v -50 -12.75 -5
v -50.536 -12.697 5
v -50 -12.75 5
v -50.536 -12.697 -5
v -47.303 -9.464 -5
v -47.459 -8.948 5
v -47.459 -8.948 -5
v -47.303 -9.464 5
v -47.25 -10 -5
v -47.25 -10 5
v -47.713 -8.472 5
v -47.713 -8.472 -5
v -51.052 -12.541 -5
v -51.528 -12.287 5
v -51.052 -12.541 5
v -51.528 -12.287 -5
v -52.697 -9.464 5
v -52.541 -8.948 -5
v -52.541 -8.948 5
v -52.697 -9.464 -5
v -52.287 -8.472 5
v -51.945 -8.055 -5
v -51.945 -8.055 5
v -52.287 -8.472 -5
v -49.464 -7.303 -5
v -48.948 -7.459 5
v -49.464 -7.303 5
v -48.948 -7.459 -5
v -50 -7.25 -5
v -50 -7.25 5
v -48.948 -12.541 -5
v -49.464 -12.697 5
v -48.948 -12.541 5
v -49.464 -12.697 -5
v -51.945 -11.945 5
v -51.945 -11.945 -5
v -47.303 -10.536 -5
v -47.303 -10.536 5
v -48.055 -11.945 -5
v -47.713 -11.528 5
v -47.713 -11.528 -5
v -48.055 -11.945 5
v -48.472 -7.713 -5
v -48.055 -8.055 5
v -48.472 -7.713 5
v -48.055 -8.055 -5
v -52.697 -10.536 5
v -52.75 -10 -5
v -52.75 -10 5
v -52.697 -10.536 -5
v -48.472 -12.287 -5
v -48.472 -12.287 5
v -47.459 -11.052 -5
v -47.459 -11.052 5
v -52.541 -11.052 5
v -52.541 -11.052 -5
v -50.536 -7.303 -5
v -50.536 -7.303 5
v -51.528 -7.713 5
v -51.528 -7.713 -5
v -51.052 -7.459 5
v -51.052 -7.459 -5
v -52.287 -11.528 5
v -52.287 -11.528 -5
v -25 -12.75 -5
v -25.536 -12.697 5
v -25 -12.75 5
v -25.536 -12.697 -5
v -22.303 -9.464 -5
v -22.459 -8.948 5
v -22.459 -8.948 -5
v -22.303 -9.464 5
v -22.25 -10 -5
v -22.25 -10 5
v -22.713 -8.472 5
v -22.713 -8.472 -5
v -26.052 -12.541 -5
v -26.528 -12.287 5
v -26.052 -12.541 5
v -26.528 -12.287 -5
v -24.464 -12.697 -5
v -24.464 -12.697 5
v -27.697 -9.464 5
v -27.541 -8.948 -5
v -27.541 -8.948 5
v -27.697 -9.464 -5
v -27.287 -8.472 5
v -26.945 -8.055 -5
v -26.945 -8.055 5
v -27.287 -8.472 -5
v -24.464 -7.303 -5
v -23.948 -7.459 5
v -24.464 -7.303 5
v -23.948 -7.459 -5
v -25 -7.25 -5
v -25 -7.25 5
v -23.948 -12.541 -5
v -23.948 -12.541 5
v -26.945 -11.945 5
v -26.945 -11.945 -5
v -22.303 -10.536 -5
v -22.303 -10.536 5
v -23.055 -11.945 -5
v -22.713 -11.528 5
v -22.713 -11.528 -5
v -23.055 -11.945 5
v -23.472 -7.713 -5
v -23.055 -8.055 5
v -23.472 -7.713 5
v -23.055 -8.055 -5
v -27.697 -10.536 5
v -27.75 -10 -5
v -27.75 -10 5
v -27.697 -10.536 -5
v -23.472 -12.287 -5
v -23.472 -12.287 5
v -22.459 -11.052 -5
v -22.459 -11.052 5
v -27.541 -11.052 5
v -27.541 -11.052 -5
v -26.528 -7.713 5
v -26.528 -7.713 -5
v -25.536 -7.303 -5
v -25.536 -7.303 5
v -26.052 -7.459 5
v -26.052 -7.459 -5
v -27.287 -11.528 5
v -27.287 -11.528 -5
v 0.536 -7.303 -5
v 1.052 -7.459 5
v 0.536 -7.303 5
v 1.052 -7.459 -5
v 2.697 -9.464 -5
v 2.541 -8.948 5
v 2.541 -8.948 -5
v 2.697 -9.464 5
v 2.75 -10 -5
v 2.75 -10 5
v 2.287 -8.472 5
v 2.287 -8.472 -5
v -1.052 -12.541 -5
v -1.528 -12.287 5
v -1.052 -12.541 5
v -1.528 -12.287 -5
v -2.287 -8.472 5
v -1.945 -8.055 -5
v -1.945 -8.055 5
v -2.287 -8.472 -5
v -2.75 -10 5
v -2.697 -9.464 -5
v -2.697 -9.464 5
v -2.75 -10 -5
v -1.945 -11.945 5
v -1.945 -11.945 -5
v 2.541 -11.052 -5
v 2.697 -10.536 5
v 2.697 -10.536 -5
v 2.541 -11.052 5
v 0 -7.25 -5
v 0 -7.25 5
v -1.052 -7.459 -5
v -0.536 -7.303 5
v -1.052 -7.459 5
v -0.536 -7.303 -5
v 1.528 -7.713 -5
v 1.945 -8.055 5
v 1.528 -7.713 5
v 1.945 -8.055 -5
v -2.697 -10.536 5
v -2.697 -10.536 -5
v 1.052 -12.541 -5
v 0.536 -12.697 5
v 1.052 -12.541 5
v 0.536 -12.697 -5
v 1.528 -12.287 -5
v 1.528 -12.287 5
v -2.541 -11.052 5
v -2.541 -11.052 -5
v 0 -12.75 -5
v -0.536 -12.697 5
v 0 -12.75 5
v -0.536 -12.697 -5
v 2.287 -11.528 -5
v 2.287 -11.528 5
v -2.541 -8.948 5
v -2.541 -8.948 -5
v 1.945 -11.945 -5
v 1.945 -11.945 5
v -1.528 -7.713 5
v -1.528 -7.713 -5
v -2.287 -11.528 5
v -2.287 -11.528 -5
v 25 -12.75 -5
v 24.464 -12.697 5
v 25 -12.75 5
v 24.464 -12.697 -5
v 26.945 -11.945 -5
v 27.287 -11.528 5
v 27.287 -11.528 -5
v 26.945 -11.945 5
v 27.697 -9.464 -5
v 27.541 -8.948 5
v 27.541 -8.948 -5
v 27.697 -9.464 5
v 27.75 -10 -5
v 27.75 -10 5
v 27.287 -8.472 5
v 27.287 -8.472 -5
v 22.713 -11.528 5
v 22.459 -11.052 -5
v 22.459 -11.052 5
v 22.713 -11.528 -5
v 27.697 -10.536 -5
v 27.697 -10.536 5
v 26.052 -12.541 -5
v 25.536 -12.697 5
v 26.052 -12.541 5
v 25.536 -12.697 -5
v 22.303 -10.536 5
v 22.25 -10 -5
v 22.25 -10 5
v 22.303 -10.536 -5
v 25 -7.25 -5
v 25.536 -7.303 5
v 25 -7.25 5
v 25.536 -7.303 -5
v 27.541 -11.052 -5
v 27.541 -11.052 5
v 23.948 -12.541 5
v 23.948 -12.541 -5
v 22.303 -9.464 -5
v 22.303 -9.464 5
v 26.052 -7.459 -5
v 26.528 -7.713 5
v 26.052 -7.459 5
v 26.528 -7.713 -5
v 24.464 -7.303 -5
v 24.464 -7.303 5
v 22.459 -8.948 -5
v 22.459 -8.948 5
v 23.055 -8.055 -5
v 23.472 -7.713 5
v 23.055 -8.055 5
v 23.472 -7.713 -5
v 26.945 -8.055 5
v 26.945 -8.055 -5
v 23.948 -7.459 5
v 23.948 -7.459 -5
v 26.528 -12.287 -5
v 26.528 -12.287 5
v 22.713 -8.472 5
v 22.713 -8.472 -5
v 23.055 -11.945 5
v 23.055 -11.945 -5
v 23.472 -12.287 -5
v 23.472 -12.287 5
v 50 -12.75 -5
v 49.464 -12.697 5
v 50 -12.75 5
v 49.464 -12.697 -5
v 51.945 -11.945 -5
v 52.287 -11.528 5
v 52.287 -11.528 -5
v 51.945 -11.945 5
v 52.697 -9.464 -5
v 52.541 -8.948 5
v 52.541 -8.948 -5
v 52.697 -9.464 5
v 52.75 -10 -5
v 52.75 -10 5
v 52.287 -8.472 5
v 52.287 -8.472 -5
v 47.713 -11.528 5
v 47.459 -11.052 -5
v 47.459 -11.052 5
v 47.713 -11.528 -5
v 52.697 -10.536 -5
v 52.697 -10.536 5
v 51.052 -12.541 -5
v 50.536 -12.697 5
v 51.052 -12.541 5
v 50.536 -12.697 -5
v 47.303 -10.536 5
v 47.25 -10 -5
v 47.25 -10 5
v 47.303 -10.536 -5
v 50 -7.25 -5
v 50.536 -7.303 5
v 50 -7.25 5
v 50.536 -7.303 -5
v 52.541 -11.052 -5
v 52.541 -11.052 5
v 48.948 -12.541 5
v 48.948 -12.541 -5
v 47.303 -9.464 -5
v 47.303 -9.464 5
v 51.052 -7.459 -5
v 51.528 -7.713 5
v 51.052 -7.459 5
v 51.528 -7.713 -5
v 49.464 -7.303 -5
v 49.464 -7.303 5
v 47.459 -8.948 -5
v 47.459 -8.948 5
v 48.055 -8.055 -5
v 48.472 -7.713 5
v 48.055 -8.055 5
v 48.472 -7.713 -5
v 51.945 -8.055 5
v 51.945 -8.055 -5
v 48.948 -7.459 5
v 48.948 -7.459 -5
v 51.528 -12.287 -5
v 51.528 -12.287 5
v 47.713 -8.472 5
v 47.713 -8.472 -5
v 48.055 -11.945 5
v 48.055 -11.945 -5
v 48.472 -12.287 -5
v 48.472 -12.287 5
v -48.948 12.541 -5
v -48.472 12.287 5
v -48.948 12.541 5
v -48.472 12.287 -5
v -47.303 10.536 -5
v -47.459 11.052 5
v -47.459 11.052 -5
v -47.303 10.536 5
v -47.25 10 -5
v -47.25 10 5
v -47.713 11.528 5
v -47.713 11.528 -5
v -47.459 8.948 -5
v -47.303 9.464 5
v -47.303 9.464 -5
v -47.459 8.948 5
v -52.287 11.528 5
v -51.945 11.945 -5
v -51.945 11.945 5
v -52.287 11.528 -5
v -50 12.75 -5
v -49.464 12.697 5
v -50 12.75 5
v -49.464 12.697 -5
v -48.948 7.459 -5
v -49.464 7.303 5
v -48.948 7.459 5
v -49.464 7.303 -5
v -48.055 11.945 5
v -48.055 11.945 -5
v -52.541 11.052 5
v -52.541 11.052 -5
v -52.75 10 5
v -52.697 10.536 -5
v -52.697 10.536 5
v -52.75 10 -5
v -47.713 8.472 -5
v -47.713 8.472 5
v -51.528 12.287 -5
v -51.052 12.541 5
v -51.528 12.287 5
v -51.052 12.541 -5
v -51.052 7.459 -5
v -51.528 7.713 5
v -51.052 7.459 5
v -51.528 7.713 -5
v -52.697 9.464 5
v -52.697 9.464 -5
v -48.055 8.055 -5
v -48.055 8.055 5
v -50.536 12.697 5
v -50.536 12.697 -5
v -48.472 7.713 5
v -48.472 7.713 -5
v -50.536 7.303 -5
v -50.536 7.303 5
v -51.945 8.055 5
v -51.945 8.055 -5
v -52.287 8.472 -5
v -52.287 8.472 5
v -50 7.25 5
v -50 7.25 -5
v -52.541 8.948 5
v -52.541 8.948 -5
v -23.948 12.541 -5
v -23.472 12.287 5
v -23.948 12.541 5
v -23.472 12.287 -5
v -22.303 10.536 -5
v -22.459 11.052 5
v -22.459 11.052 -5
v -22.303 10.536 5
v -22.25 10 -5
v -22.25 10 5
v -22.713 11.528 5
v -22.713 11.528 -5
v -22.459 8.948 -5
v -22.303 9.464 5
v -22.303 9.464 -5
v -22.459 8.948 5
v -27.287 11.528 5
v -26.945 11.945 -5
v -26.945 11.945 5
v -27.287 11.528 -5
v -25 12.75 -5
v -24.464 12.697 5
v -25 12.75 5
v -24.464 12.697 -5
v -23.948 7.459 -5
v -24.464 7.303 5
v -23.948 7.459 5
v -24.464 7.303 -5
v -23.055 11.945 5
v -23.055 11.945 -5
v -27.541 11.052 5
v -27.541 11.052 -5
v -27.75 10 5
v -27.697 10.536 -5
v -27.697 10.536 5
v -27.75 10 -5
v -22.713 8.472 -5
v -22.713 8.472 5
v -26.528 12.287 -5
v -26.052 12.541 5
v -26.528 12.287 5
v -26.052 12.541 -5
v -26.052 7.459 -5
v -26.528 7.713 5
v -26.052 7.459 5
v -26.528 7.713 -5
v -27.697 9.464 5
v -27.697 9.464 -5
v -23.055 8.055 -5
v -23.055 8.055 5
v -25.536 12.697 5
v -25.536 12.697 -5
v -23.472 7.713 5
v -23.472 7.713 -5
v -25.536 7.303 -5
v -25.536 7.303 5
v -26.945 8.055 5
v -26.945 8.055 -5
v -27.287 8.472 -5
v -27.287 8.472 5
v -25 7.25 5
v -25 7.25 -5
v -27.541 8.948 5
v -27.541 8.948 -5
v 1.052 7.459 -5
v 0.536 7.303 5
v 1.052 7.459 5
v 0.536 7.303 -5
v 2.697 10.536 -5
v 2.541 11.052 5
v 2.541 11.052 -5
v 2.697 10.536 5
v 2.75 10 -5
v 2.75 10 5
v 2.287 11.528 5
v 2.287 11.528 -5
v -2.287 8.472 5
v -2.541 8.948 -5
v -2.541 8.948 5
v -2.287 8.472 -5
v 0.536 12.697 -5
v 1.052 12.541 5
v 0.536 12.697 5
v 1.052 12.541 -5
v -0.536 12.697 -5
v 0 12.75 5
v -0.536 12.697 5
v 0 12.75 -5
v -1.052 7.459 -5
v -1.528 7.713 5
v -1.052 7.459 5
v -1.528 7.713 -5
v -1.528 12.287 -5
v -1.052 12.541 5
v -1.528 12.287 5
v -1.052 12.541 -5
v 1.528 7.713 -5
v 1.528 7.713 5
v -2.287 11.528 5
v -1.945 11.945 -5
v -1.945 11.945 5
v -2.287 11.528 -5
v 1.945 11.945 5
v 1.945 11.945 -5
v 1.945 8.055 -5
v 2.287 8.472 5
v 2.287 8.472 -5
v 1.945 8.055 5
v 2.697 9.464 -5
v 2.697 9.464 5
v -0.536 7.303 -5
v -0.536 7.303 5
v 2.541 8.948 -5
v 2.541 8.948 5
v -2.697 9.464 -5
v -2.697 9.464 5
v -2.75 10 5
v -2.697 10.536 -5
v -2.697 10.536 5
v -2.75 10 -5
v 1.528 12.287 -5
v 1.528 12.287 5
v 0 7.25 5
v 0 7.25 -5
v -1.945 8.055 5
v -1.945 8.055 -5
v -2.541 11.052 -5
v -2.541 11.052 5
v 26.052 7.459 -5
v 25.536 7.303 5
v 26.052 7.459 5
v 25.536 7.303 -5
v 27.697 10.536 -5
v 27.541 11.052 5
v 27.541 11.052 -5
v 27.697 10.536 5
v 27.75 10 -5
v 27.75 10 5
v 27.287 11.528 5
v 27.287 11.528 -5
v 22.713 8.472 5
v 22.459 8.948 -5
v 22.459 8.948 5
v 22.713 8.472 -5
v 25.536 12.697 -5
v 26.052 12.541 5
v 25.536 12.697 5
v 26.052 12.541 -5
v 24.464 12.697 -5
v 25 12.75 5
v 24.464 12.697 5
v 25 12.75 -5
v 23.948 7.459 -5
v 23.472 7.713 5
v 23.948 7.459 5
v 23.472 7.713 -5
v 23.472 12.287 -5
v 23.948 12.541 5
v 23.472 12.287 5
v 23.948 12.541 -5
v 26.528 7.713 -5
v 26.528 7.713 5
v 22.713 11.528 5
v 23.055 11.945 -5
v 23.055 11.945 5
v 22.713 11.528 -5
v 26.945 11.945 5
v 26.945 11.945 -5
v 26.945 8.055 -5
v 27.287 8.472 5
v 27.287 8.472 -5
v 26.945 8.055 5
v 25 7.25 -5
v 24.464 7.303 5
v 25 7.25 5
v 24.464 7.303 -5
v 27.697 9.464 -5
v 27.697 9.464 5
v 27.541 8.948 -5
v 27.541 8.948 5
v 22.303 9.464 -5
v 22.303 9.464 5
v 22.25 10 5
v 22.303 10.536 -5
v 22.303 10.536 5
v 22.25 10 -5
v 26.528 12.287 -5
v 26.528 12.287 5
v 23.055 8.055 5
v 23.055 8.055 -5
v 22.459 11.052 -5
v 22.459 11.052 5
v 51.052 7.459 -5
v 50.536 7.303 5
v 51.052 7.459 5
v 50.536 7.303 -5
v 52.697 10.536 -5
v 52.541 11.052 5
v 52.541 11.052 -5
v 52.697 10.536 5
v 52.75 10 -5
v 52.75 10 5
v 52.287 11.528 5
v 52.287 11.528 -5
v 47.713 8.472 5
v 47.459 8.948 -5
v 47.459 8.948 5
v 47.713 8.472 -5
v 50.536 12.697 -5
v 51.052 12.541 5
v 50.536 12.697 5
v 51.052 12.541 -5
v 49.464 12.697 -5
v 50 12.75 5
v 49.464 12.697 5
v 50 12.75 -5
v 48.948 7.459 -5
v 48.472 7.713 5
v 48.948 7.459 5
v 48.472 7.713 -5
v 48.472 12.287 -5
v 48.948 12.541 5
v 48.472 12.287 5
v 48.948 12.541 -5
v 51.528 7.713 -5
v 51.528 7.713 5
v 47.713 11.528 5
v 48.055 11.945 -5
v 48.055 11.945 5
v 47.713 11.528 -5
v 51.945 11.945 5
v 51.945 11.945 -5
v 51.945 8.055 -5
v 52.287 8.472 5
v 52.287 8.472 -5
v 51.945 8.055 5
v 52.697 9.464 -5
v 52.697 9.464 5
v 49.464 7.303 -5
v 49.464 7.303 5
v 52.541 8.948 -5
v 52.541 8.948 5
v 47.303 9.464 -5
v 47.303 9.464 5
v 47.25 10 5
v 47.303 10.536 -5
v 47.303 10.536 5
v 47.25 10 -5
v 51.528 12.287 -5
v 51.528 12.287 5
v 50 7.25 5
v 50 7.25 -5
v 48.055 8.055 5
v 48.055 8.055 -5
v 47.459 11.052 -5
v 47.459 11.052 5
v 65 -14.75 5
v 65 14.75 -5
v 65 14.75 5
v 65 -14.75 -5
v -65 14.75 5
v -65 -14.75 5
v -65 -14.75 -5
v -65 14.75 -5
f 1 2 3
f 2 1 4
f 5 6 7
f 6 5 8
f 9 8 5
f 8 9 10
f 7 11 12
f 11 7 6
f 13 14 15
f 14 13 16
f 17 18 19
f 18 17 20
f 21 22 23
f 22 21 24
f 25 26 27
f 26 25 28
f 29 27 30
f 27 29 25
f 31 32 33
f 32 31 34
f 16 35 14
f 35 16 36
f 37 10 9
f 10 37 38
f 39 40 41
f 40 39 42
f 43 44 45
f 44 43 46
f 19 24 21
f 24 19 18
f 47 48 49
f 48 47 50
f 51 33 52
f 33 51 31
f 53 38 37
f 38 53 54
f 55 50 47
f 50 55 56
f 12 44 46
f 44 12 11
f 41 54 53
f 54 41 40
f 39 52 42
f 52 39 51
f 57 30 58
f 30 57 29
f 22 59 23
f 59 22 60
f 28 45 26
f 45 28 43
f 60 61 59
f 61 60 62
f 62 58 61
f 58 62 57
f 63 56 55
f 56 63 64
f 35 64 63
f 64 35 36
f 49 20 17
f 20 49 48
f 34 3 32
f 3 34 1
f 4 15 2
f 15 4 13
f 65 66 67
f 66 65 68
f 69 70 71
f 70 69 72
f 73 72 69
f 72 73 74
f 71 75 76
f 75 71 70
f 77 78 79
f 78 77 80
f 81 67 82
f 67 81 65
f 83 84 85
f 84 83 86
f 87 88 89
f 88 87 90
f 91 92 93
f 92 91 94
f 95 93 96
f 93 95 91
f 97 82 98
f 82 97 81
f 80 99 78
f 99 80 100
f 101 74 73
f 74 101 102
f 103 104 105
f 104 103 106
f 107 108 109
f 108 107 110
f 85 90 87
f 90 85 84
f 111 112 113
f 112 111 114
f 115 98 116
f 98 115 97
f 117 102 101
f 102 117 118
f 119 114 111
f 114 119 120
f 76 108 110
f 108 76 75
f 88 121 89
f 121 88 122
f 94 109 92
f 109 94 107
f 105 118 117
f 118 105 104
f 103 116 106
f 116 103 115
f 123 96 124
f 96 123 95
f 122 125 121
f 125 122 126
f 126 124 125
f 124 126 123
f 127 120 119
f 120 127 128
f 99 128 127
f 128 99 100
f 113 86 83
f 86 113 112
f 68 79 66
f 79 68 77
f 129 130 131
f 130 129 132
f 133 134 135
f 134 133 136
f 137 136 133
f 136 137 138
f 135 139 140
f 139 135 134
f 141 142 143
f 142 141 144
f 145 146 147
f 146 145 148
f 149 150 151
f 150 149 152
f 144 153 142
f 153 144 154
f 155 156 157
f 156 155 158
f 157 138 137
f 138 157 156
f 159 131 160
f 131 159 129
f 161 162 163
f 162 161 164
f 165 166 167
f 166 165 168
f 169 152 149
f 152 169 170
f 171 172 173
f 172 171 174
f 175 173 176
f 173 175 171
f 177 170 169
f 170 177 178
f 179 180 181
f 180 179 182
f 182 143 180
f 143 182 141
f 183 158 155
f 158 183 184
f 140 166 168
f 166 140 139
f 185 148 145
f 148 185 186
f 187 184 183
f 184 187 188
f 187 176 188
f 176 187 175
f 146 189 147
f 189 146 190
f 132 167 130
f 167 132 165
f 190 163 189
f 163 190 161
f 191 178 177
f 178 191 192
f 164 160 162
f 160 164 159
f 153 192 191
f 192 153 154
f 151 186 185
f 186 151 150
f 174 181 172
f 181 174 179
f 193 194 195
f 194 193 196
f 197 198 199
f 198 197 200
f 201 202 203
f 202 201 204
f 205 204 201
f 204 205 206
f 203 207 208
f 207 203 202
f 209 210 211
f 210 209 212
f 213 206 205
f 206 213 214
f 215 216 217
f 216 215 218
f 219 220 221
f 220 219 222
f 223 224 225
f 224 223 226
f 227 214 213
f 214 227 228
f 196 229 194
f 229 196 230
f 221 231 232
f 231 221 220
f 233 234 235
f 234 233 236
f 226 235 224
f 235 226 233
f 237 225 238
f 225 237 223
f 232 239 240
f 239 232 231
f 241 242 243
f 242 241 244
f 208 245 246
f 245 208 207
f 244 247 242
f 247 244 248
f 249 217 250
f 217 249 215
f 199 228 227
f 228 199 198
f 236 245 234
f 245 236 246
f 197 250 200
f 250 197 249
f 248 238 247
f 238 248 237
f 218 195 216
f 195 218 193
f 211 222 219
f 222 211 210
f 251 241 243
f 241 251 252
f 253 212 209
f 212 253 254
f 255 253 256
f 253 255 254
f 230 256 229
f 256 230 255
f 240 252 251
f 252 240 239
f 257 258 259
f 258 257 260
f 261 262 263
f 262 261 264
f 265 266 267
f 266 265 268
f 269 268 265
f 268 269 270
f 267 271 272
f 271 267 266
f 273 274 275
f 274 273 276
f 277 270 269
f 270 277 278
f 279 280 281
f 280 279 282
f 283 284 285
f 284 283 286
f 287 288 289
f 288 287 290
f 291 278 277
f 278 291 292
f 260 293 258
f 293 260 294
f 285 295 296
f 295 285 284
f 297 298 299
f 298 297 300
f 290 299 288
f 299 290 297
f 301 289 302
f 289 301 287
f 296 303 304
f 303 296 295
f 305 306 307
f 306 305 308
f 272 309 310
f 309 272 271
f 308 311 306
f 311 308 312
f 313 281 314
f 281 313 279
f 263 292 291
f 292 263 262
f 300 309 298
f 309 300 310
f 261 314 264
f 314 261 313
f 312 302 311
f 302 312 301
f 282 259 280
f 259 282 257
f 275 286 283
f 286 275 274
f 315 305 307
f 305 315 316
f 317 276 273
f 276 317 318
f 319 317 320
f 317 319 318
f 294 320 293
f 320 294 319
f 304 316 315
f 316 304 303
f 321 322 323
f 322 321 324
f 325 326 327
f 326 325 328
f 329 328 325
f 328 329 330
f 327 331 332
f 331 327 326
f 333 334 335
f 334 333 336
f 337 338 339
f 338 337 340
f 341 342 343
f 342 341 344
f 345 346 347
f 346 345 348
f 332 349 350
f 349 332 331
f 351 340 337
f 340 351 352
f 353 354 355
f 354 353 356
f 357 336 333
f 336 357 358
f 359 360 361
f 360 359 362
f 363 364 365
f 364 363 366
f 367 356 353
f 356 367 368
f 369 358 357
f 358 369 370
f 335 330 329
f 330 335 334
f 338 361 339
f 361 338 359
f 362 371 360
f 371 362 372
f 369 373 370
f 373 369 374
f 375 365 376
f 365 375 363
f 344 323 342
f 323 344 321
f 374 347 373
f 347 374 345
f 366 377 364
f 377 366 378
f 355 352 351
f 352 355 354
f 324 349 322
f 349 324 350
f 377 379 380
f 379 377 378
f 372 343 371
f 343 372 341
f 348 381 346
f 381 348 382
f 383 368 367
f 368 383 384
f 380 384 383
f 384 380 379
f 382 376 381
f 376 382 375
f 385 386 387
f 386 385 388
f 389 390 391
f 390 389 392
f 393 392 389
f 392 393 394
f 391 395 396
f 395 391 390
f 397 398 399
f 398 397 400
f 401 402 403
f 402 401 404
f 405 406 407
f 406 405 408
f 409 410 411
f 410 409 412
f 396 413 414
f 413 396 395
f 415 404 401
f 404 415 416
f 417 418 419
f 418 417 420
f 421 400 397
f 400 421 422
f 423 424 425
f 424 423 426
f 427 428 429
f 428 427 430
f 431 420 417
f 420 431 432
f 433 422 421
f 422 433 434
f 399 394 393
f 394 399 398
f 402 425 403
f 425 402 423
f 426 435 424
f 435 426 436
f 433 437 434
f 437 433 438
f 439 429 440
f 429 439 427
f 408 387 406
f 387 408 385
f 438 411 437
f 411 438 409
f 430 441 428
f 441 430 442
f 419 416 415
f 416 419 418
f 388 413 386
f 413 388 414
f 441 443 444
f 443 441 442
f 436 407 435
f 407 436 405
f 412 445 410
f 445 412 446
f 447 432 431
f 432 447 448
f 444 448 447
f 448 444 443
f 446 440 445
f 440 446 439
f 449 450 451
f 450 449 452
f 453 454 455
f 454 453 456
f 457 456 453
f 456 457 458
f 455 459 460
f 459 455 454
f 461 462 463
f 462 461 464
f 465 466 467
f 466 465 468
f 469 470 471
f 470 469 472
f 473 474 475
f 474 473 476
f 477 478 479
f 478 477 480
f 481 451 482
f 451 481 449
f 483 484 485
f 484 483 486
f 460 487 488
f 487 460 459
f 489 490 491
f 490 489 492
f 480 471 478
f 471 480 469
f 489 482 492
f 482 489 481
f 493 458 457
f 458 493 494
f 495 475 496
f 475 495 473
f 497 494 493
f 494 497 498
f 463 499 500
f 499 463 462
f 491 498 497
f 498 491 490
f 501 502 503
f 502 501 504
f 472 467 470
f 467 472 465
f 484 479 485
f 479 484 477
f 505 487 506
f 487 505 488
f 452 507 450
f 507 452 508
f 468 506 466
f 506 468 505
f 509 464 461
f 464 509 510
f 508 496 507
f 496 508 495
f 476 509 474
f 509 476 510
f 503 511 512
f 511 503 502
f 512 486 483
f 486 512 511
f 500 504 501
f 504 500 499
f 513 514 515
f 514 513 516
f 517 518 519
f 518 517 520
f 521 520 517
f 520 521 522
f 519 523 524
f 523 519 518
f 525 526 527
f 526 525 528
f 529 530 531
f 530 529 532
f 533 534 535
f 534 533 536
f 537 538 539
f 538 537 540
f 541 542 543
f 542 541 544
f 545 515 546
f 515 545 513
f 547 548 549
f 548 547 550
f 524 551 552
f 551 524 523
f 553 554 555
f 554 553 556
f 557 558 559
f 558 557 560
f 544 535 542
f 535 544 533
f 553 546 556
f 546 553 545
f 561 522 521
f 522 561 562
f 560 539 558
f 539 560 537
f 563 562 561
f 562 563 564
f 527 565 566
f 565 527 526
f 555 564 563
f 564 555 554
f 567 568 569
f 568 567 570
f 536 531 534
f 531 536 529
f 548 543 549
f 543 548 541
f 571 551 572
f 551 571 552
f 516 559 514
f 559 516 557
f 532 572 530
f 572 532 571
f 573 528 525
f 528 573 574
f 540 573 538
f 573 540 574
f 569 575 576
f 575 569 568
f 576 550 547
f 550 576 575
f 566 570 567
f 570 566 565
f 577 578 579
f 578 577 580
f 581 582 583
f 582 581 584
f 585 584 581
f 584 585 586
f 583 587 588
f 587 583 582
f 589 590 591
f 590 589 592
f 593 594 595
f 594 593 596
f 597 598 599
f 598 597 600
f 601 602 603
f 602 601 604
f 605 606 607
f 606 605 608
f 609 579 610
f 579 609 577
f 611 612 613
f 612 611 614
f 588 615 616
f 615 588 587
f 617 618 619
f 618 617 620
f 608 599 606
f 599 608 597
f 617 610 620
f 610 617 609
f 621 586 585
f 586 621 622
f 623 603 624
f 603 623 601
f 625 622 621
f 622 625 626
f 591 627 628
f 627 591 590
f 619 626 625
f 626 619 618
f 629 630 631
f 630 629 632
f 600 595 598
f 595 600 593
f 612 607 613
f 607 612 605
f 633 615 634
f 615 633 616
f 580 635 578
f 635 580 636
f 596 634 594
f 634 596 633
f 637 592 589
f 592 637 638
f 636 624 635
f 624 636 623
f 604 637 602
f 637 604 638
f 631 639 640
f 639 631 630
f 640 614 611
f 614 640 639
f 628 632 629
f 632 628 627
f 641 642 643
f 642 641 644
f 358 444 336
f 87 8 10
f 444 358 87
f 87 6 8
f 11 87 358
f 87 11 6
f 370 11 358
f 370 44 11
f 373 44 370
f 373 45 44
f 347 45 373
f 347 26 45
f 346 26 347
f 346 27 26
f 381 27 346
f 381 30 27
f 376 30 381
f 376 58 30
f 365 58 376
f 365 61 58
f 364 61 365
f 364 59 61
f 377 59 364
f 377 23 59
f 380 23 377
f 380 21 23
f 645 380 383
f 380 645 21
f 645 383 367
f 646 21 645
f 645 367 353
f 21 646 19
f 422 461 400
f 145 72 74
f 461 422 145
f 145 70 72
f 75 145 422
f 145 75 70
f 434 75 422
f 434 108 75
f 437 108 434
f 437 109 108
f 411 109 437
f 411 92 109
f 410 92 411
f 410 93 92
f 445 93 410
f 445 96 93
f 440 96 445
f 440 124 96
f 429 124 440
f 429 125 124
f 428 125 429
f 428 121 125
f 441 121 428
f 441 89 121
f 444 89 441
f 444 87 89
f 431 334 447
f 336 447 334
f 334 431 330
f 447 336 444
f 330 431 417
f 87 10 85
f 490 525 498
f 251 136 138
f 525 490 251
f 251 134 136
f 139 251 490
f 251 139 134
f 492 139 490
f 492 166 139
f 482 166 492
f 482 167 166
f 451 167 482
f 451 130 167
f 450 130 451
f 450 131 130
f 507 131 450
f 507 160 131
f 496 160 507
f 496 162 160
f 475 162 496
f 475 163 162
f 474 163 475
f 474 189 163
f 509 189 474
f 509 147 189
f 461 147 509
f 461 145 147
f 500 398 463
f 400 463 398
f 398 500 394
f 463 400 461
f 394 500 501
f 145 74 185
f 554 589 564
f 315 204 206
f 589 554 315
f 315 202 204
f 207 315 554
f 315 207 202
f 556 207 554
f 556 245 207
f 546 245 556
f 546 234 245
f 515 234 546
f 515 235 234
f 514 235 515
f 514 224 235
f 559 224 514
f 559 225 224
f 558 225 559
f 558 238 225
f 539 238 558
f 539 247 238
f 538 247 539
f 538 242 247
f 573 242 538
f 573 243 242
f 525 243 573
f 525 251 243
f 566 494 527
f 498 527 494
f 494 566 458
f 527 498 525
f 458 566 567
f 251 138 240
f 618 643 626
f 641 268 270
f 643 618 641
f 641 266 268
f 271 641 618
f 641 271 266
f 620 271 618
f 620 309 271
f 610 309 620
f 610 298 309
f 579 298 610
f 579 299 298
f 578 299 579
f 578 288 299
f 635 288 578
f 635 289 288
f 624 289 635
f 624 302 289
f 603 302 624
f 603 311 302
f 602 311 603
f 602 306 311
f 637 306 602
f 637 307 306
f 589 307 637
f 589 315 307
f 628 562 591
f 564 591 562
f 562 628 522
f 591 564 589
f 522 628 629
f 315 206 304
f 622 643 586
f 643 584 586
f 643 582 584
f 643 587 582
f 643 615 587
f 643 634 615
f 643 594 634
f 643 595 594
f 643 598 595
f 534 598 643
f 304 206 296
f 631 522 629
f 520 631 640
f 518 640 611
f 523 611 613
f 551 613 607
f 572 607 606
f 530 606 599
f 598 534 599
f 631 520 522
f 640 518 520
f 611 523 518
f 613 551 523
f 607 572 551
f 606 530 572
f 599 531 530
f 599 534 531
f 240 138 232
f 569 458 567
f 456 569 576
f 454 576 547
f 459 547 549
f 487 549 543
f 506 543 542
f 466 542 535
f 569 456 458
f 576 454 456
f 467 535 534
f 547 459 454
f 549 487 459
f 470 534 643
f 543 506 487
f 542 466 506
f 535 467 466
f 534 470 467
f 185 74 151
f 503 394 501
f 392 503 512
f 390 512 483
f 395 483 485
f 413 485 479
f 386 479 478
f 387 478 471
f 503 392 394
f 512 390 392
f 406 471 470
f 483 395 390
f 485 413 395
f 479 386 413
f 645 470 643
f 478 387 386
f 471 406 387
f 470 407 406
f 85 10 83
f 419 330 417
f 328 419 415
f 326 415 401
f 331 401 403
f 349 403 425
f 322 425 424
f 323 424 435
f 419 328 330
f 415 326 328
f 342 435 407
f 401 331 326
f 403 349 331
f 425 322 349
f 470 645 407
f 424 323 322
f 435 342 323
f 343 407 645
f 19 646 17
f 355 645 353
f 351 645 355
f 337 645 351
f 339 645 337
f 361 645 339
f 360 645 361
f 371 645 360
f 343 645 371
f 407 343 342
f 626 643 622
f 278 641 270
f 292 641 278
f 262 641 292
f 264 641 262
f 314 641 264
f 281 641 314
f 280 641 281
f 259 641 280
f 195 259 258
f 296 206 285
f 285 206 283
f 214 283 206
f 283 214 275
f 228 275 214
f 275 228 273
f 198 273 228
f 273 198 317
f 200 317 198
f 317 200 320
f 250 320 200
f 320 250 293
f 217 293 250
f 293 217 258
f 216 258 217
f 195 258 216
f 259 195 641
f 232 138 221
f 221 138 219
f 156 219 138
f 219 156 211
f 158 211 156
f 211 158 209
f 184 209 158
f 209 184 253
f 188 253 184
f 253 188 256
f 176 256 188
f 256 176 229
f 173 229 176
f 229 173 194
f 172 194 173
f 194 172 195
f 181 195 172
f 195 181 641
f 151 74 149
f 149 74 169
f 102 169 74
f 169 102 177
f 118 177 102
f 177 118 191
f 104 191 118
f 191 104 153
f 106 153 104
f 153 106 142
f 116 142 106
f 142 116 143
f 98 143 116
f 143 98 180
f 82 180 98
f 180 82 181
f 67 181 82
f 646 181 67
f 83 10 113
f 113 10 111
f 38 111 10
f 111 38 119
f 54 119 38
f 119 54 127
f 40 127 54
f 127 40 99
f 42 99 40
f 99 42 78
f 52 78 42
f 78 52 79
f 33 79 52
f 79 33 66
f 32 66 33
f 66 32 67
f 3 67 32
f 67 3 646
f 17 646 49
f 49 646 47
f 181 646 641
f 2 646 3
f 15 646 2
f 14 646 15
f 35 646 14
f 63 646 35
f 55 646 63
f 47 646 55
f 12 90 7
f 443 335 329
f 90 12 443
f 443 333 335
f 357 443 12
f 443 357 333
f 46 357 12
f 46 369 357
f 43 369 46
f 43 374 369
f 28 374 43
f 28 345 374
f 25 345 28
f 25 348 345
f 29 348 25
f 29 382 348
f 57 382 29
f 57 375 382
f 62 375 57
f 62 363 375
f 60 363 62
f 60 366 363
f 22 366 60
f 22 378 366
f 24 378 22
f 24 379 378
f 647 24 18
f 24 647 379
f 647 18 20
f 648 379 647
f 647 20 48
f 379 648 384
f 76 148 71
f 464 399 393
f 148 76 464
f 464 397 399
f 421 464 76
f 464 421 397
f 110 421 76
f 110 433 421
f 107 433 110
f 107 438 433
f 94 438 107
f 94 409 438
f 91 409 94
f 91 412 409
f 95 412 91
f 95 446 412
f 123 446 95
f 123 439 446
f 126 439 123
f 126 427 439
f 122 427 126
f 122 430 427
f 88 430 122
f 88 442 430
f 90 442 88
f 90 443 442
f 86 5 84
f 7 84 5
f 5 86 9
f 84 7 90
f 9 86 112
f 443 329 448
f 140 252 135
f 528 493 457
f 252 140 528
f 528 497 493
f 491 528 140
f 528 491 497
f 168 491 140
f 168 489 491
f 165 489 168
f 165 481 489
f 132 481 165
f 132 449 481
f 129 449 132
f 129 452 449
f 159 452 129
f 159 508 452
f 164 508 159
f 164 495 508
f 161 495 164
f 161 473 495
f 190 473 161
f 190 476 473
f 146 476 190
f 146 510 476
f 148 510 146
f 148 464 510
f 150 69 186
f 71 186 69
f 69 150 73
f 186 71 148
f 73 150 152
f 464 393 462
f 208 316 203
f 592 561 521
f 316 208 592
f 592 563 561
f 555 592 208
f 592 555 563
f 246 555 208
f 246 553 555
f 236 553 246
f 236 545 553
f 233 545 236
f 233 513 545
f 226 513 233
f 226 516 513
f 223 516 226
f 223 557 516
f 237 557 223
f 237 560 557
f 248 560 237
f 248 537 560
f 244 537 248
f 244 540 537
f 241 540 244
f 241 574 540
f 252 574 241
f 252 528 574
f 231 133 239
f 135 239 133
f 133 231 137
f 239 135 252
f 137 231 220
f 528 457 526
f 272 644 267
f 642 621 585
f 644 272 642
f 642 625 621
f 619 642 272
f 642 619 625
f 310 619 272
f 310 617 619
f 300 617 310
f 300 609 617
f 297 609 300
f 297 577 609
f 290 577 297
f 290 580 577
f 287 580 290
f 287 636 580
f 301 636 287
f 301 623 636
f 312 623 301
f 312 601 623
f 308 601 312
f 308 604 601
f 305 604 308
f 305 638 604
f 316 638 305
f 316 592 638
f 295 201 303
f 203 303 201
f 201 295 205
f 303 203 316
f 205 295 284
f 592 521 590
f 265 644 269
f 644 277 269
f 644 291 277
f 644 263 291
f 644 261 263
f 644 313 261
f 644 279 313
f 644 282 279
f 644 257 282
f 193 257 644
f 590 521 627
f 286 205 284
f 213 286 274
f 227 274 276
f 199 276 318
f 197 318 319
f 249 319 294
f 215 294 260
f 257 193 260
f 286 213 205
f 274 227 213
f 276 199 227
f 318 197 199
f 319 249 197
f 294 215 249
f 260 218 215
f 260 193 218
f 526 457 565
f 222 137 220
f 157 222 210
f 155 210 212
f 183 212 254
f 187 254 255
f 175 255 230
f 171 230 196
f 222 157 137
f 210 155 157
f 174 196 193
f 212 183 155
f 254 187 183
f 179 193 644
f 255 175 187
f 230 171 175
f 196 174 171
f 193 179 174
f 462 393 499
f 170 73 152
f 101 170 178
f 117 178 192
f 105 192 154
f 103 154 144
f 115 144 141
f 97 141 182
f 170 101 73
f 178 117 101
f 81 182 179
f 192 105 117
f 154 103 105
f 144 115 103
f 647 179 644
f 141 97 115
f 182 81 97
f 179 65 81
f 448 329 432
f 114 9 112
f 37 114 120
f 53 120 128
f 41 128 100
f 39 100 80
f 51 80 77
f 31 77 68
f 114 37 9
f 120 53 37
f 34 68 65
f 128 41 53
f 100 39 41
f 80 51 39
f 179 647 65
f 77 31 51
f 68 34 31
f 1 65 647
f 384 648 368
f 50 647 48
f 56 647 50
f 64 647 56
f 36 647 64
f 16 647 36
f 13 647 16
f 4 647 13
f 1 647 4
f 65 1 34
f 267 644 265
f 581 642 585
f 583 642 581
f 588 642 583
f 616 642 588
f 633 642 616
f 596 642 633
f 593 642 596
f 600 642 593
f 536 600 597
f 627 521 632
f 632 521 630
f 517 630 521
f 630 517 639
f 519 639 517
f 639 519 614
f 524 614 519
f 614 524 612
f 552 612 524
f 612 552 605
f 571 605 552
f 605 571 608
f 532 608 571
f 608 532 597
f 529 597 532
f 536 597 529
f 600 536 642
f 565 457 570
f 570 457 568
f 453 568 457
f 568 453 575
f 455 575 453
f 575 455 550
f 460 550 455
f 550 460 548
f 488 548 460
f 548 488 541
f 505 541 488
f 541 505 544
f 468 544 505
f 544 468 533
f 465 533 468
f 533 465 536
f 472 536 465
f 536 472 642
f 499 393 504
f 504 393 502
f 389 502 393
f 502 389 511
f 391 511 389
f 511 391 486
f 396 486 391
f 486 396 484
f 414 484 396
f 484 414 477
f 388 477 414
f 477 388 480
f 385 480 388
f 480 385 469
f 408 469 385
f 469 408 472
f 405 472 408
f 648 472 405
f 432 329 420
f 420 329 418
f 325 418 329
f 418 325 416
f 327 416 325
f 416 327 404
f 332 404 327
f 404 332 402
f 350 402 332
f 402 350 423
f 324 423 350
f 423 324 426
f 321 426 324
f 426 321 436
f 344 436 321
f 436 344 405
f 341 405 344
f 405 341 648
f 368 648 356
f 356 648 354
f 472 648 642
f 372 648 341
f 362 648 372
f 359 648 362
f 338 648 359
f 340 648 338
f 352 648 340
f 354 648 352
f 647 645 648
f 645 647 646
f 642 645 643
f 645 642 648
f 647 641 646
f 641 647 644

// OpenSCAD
$fn = 32;

// ----------------------------------------------------------------------
// Hole bar, 5 x Ø5.5
// tworows layout, 15 mm edge offset
// ----------------------------------------------------------------------

// --- parameters (mm) ---
bar_w = 29.5;     // bar width (Y)
seat_tol = 0.15;  // tolerance at the seating features
free_tol = 0.5;   // general tolerance on the free sizes
bar_t = 10;       // bar thickness (Z)
holes = 5;        // holes per row
hole_d = 5.5;     // hole diameter
edge = 15;        // offset from the bar end to the first hole
pitch = 25;       // pitch between neighbouring holes
row_offset = 20;  // distance between the two rows

// --- derived feature positions (mm) ---
span = (holes - 1) * pitch;   // = 100   distance between the end holes
bar_l = span + 2 * edge;      // = 130   overall bar length
start_x = -bar_l / 2 + edge;  // = -50   X of the first hole
feature_centers = [
  [start_x + 0 * pitch, -row_offset / 2],
  [start_x + 1 * pitch, -row_offset / 2],
  [start_x + 2 * pitch, -row_offset / 2],
  [start_x + 3 * pitch, -row_offset / 2],
  [start_x + 4 * pitch, -row_offset / 2]
];   // hole centres of the first row
row2_centers = [
  [start_x + 0 * pitch, row_offset / 2],
  [start_x + 1 * pitch, row_offset / 2],
  [start_x + 2 * pitch, row_offset / 2],
  [start_x + 3 * pitch, row_offset / 2],
  [start_x + 4 * pitch, row_offset / 2]
];   // hole centres of the second row

// bar with two rows of holes, both read from their own centre arrays
difference() {
  translate([-bar_l / 2, -bar_w / 2, -bar_t / 2]) cube([bar_l, bar_w, bar_t]);
  for (centre = feature_centers)
    translate([centre[0], centre[1], 0])
      cylinder(d = hole_d, h = bar_t + 2, center = true);
  for (centre = row2_centers)
    translate([centre[0], centre[1], 0])
      cylinder(d = hole_d, h = bar_t + 2, center = true);
}
